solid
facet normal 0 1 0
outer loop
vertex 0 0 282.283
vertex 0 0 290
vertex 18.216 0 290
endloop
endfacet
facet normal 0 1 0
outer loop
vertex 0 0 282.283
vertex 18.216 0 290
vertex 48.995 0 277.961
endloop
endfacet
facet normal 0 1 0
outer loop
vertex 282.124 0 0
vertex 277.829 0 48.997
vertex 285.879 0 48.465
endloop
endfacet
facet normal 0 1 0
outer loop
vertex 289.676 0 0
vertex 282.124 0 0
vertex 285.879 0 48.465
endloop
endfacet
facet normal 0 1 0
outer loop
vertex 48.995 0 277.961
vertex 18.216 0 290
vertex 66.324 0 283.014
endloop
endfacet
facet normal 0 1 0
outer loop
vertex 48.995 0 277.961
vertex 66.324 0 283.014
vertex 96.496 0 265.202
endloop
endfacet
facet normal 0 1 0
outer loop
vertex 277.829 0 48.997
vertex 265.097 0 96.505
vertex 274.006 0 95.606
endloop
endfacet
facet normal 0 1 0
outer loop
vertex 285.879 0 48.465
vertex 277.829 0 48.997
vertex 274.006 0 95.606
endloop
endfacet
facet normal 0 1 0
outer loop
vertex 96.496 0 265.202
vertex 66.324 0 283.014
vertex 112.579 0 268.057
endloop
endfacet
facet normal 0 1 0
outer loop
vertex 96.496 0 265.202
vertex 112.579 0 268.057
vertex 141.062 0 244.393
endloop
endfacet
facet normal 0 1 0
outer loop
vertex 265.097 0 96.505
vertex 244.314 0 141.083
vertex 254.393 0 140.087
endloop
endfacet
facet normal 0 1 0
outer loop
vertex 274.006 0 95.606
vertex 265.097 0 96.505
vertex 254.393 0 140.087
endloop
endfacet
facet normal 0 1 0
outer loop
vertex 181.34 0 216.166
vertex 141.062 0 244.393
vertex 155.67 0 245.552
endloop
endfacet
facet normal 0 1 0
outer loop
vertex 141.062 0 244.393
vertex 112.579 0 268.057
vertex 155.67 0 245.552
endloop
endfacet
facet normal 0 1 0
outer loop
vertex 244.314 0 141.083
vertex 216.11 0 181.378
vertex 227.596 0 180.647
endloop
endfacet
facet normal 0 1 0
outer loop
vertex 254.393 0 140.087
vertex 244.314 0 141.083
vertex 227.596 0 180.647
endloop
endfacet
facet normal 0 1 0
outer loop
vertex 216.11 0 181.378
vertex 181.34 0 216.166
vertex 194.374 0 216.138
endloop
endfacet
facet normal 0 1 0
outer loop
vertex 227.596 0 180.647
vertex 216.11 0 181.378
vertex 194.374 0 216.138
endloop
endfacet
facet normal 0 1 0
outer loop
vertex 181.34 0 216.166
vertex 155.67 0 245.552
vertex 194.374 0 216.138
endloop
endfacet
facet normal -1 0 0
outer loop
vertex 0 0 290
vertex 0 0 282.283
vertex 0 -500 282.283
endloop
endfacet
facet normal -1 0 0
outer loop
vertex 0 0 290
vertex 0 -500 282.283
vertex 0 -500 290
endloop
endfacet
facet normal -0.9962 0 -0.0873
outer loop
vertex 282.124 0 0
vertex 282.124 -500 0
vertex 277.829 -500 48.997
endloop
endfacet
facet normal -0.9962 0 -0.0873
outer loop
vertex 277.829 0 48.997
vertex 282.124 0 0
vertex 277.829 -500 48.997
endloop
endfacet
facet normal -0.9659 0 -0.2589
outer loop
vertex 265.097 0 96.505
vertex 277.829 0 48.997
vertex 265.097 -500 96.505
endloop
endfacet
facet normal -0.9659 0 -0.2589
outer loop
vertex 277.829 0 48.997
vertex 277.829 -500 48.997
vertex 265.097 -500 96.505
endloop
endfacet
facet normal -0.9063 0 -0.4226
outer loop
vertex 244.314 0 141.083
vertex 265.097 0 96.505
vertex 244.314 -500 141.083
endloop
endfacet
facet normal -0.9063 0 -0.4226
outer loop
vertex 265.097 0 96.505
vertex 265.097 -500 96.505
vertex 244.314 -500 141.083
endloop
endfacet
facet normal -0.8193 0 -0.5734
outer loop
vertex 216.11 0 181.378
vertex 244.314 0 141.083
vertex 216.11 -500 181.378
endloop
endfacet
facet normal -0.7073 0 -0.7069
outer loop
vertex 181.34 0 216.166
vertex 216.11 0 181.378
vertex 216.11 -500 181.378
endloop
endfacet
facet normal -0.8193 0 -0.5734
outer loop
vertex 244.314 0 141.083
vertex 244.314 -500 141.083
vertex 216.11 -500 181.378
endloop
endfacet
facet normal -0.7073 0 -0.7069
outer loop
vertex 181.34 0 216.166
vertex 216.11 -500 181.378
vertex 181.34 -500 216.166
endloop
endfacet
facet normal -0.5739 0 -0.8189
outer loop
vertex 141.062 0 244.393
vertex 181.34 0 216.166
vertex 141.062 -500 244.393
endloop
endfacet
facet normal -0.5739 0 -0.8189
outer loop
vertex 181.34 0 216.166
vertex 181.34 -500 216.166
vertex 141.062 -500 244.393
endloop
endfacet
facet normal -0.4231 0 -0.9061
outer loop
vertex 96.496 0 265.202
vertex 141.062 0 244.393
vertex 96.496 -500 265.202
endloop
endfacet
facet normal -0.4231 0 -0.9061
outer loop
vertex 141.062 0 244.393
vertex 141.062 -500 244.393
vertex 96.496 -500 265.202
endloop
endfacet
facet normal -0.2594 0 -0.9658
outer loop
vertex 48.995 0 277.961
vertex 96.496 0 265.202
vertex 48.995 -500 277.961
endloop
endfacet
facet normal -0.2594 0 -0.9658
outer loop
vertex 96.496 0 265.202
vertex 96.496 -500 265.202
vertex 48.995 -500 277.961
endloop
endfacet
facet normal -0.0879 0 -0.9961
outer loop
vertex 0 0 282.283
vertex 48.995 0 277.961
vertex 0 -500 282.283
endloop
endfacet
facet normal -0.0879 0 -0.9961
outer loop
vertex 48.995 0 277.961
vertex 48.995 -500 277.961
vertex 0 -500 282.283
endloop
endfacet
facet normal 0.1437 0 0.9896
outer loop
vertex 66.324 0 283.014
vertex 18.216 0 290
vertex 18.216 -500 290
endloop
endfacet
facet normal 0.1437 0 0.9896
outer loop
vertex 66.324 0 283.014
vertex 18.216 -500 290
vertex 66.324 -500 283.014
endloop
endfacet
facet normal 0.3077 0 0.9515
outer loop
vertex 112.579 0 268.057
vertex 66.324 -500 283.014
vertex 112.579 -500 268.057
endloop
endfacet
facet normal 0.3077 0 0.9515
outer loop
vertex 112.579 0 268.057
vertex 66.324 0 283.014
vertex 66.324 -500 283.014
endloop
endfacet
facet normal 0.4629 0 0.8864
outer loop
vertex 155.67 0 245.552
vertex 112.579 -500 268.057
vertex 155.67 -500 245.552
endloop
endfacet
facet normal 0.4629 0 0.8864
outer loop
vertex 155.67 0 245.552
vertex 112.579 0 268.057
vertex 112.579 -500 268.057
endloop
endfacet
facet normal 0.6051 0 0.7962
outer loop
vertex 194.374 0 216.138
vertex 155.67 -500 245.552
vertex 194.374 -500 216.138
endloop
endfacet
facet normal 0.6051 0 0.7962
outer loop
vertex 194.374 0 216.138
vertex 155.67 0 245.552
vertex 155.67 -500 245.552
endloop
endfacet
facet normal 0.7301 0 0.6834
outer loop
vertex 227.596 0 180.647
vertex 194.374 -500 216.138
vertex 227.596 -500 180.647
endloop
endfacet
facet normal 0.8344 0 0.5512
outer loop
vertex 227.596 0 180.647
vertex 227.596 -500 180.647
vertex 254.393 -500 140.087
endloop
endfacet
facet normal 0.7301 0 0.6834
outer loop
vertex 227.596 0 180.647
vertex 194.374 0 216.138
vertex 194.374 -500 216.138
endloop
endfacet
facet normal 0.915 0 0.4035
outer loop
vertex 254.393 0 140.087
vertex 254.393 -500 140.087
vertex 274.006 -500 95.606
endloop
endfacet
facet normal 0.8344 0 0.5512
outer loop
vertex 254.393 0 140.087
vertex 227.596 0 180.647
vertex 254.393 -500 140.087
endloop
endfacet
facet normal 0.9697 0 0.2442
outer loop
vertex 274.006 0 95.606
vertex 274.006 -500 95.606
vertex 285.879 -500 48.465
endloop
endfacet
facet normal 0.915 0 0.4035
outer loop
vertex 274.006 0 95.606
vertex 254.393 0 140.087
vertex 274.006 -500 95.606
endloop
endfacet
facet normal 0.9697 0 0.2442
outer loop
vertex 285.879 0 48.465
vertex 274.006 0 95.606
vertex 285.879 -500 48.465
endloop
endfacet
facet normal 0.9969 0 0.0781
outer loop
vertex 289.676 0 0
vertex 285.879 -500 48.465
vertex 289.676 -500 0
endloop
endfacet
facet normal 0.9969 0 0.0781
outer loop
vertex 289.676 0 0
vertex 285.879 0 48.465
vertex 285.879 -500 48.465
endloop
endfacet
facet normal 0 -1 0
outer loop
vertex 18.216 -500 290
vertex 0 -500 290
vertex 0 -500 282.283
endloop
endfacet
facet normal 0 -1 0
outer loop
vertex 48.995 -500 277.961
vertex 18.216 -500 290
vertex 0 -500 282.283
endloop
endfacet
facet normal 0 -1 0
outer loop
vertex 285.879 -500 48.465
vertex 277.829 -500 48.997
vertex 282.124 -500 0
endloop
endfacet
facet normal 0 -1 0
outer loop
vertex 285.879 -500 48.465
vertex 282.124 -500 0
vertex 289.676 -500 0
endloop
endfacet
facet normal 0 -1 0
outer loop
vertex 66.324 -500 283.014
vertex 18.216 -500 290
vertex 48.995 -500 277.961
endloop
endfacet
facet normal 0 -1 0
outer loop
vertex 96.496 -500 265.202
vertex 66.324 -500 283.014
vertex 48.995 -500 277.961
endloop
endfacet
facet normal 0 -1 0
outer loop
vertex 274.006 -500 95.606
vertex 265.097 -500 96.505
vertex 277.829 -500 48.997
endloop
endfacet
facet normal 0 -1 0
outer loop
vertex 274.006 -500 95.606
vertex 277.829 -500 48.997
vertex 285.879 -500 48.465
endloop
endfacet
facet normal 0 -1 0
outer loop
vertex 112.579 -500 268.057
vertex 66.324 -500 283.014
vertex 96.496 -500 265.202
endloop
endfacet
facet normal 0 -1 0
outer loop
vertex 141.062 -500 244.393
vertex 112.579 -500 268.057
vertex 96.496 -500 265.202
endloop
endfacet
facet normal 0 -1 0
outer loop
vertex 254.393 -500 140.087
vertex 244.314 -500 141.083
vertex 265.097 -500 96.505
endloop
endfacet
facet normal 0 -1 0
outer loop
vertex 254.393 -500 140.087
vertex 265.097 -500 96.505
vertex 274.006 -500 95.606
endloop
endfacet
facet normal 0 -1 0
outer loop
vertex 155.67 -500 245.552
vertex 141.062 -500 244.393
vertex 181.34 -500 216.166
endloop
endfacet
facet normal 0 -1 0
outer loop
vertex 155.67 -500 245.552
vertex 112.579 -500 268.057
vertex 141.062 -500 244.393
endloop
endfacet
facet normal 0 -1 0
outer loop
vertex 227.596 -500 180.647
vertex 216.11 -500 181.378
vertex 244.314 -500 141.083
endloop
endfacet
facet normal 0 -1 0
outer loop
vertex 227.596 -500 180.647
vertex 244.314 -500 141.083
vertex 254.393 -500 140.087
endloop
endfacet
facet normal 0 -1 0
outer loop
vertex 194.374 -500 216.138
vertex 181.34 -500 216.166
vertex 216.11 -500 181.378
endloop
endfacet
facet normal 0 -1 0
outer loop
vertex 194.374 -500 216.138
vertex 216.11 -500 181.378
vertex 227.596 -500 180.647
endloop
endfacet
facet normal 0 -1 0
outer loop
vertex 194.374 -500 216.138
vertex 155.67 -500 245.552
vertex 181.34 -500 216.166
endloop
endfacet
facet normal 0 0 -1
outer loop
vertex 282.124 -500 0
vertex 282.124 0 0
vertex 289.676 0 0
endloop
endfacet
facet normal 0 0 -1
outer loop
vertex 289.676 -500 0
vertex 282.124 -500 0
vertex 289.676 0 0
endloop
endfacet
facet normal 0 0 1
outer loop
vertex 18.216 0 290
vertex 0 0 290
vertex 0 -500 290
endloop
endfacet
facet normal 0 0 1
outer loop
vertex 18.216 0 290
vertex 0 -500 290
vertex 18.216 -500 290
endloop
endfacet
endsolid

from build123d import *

# Parameters (mm, degrees)
F0_W     = 290
F0_H     = 290
F1_DEPTH = 500
F3_DEPTH = 795
F5_DEPTH = 770


with BuildPart() as f1:
    # F0 (on Front) → F1 (new body)
    with BuildSketch(Plane.XZ):
        with Locations((145, 145)):
            Rectangle(F0_W, F0_H)
    extrude(amount=F1_DEPTH)

    # F2 (on face) → F3 (cut)
    with BuildSketch(Plane.XZ):
        with BuildLine():
            ThreePointArc((18.21568, 290), (211.733128, 199.092972), (289.675921, 0))
            Line((289.675921, 0), (290, 0))
            Line((290, 0), (290, 290))
            Line((290, 290), (18.21568, 290))
        make_face()
    extrude(amount=F3_DEPTH, mode=Mode.SUBTRACT)

    # F4 (on face) → F5 (cut)
    with BuildSketch(Plane.XZ.offset(500)):
        with BuildLine():
            Line((0, 0), (282.123595, 0))
            ThreePointArc((282.123595, 0), (199.483979, 199.530675), (0, 282.282948))
            Line((0, 282.282948), (0, 0))
        make_face()
    extrude(amount=-F5_DEPTH, mode=Mode.SUBTRACT)


solid = f1.part
